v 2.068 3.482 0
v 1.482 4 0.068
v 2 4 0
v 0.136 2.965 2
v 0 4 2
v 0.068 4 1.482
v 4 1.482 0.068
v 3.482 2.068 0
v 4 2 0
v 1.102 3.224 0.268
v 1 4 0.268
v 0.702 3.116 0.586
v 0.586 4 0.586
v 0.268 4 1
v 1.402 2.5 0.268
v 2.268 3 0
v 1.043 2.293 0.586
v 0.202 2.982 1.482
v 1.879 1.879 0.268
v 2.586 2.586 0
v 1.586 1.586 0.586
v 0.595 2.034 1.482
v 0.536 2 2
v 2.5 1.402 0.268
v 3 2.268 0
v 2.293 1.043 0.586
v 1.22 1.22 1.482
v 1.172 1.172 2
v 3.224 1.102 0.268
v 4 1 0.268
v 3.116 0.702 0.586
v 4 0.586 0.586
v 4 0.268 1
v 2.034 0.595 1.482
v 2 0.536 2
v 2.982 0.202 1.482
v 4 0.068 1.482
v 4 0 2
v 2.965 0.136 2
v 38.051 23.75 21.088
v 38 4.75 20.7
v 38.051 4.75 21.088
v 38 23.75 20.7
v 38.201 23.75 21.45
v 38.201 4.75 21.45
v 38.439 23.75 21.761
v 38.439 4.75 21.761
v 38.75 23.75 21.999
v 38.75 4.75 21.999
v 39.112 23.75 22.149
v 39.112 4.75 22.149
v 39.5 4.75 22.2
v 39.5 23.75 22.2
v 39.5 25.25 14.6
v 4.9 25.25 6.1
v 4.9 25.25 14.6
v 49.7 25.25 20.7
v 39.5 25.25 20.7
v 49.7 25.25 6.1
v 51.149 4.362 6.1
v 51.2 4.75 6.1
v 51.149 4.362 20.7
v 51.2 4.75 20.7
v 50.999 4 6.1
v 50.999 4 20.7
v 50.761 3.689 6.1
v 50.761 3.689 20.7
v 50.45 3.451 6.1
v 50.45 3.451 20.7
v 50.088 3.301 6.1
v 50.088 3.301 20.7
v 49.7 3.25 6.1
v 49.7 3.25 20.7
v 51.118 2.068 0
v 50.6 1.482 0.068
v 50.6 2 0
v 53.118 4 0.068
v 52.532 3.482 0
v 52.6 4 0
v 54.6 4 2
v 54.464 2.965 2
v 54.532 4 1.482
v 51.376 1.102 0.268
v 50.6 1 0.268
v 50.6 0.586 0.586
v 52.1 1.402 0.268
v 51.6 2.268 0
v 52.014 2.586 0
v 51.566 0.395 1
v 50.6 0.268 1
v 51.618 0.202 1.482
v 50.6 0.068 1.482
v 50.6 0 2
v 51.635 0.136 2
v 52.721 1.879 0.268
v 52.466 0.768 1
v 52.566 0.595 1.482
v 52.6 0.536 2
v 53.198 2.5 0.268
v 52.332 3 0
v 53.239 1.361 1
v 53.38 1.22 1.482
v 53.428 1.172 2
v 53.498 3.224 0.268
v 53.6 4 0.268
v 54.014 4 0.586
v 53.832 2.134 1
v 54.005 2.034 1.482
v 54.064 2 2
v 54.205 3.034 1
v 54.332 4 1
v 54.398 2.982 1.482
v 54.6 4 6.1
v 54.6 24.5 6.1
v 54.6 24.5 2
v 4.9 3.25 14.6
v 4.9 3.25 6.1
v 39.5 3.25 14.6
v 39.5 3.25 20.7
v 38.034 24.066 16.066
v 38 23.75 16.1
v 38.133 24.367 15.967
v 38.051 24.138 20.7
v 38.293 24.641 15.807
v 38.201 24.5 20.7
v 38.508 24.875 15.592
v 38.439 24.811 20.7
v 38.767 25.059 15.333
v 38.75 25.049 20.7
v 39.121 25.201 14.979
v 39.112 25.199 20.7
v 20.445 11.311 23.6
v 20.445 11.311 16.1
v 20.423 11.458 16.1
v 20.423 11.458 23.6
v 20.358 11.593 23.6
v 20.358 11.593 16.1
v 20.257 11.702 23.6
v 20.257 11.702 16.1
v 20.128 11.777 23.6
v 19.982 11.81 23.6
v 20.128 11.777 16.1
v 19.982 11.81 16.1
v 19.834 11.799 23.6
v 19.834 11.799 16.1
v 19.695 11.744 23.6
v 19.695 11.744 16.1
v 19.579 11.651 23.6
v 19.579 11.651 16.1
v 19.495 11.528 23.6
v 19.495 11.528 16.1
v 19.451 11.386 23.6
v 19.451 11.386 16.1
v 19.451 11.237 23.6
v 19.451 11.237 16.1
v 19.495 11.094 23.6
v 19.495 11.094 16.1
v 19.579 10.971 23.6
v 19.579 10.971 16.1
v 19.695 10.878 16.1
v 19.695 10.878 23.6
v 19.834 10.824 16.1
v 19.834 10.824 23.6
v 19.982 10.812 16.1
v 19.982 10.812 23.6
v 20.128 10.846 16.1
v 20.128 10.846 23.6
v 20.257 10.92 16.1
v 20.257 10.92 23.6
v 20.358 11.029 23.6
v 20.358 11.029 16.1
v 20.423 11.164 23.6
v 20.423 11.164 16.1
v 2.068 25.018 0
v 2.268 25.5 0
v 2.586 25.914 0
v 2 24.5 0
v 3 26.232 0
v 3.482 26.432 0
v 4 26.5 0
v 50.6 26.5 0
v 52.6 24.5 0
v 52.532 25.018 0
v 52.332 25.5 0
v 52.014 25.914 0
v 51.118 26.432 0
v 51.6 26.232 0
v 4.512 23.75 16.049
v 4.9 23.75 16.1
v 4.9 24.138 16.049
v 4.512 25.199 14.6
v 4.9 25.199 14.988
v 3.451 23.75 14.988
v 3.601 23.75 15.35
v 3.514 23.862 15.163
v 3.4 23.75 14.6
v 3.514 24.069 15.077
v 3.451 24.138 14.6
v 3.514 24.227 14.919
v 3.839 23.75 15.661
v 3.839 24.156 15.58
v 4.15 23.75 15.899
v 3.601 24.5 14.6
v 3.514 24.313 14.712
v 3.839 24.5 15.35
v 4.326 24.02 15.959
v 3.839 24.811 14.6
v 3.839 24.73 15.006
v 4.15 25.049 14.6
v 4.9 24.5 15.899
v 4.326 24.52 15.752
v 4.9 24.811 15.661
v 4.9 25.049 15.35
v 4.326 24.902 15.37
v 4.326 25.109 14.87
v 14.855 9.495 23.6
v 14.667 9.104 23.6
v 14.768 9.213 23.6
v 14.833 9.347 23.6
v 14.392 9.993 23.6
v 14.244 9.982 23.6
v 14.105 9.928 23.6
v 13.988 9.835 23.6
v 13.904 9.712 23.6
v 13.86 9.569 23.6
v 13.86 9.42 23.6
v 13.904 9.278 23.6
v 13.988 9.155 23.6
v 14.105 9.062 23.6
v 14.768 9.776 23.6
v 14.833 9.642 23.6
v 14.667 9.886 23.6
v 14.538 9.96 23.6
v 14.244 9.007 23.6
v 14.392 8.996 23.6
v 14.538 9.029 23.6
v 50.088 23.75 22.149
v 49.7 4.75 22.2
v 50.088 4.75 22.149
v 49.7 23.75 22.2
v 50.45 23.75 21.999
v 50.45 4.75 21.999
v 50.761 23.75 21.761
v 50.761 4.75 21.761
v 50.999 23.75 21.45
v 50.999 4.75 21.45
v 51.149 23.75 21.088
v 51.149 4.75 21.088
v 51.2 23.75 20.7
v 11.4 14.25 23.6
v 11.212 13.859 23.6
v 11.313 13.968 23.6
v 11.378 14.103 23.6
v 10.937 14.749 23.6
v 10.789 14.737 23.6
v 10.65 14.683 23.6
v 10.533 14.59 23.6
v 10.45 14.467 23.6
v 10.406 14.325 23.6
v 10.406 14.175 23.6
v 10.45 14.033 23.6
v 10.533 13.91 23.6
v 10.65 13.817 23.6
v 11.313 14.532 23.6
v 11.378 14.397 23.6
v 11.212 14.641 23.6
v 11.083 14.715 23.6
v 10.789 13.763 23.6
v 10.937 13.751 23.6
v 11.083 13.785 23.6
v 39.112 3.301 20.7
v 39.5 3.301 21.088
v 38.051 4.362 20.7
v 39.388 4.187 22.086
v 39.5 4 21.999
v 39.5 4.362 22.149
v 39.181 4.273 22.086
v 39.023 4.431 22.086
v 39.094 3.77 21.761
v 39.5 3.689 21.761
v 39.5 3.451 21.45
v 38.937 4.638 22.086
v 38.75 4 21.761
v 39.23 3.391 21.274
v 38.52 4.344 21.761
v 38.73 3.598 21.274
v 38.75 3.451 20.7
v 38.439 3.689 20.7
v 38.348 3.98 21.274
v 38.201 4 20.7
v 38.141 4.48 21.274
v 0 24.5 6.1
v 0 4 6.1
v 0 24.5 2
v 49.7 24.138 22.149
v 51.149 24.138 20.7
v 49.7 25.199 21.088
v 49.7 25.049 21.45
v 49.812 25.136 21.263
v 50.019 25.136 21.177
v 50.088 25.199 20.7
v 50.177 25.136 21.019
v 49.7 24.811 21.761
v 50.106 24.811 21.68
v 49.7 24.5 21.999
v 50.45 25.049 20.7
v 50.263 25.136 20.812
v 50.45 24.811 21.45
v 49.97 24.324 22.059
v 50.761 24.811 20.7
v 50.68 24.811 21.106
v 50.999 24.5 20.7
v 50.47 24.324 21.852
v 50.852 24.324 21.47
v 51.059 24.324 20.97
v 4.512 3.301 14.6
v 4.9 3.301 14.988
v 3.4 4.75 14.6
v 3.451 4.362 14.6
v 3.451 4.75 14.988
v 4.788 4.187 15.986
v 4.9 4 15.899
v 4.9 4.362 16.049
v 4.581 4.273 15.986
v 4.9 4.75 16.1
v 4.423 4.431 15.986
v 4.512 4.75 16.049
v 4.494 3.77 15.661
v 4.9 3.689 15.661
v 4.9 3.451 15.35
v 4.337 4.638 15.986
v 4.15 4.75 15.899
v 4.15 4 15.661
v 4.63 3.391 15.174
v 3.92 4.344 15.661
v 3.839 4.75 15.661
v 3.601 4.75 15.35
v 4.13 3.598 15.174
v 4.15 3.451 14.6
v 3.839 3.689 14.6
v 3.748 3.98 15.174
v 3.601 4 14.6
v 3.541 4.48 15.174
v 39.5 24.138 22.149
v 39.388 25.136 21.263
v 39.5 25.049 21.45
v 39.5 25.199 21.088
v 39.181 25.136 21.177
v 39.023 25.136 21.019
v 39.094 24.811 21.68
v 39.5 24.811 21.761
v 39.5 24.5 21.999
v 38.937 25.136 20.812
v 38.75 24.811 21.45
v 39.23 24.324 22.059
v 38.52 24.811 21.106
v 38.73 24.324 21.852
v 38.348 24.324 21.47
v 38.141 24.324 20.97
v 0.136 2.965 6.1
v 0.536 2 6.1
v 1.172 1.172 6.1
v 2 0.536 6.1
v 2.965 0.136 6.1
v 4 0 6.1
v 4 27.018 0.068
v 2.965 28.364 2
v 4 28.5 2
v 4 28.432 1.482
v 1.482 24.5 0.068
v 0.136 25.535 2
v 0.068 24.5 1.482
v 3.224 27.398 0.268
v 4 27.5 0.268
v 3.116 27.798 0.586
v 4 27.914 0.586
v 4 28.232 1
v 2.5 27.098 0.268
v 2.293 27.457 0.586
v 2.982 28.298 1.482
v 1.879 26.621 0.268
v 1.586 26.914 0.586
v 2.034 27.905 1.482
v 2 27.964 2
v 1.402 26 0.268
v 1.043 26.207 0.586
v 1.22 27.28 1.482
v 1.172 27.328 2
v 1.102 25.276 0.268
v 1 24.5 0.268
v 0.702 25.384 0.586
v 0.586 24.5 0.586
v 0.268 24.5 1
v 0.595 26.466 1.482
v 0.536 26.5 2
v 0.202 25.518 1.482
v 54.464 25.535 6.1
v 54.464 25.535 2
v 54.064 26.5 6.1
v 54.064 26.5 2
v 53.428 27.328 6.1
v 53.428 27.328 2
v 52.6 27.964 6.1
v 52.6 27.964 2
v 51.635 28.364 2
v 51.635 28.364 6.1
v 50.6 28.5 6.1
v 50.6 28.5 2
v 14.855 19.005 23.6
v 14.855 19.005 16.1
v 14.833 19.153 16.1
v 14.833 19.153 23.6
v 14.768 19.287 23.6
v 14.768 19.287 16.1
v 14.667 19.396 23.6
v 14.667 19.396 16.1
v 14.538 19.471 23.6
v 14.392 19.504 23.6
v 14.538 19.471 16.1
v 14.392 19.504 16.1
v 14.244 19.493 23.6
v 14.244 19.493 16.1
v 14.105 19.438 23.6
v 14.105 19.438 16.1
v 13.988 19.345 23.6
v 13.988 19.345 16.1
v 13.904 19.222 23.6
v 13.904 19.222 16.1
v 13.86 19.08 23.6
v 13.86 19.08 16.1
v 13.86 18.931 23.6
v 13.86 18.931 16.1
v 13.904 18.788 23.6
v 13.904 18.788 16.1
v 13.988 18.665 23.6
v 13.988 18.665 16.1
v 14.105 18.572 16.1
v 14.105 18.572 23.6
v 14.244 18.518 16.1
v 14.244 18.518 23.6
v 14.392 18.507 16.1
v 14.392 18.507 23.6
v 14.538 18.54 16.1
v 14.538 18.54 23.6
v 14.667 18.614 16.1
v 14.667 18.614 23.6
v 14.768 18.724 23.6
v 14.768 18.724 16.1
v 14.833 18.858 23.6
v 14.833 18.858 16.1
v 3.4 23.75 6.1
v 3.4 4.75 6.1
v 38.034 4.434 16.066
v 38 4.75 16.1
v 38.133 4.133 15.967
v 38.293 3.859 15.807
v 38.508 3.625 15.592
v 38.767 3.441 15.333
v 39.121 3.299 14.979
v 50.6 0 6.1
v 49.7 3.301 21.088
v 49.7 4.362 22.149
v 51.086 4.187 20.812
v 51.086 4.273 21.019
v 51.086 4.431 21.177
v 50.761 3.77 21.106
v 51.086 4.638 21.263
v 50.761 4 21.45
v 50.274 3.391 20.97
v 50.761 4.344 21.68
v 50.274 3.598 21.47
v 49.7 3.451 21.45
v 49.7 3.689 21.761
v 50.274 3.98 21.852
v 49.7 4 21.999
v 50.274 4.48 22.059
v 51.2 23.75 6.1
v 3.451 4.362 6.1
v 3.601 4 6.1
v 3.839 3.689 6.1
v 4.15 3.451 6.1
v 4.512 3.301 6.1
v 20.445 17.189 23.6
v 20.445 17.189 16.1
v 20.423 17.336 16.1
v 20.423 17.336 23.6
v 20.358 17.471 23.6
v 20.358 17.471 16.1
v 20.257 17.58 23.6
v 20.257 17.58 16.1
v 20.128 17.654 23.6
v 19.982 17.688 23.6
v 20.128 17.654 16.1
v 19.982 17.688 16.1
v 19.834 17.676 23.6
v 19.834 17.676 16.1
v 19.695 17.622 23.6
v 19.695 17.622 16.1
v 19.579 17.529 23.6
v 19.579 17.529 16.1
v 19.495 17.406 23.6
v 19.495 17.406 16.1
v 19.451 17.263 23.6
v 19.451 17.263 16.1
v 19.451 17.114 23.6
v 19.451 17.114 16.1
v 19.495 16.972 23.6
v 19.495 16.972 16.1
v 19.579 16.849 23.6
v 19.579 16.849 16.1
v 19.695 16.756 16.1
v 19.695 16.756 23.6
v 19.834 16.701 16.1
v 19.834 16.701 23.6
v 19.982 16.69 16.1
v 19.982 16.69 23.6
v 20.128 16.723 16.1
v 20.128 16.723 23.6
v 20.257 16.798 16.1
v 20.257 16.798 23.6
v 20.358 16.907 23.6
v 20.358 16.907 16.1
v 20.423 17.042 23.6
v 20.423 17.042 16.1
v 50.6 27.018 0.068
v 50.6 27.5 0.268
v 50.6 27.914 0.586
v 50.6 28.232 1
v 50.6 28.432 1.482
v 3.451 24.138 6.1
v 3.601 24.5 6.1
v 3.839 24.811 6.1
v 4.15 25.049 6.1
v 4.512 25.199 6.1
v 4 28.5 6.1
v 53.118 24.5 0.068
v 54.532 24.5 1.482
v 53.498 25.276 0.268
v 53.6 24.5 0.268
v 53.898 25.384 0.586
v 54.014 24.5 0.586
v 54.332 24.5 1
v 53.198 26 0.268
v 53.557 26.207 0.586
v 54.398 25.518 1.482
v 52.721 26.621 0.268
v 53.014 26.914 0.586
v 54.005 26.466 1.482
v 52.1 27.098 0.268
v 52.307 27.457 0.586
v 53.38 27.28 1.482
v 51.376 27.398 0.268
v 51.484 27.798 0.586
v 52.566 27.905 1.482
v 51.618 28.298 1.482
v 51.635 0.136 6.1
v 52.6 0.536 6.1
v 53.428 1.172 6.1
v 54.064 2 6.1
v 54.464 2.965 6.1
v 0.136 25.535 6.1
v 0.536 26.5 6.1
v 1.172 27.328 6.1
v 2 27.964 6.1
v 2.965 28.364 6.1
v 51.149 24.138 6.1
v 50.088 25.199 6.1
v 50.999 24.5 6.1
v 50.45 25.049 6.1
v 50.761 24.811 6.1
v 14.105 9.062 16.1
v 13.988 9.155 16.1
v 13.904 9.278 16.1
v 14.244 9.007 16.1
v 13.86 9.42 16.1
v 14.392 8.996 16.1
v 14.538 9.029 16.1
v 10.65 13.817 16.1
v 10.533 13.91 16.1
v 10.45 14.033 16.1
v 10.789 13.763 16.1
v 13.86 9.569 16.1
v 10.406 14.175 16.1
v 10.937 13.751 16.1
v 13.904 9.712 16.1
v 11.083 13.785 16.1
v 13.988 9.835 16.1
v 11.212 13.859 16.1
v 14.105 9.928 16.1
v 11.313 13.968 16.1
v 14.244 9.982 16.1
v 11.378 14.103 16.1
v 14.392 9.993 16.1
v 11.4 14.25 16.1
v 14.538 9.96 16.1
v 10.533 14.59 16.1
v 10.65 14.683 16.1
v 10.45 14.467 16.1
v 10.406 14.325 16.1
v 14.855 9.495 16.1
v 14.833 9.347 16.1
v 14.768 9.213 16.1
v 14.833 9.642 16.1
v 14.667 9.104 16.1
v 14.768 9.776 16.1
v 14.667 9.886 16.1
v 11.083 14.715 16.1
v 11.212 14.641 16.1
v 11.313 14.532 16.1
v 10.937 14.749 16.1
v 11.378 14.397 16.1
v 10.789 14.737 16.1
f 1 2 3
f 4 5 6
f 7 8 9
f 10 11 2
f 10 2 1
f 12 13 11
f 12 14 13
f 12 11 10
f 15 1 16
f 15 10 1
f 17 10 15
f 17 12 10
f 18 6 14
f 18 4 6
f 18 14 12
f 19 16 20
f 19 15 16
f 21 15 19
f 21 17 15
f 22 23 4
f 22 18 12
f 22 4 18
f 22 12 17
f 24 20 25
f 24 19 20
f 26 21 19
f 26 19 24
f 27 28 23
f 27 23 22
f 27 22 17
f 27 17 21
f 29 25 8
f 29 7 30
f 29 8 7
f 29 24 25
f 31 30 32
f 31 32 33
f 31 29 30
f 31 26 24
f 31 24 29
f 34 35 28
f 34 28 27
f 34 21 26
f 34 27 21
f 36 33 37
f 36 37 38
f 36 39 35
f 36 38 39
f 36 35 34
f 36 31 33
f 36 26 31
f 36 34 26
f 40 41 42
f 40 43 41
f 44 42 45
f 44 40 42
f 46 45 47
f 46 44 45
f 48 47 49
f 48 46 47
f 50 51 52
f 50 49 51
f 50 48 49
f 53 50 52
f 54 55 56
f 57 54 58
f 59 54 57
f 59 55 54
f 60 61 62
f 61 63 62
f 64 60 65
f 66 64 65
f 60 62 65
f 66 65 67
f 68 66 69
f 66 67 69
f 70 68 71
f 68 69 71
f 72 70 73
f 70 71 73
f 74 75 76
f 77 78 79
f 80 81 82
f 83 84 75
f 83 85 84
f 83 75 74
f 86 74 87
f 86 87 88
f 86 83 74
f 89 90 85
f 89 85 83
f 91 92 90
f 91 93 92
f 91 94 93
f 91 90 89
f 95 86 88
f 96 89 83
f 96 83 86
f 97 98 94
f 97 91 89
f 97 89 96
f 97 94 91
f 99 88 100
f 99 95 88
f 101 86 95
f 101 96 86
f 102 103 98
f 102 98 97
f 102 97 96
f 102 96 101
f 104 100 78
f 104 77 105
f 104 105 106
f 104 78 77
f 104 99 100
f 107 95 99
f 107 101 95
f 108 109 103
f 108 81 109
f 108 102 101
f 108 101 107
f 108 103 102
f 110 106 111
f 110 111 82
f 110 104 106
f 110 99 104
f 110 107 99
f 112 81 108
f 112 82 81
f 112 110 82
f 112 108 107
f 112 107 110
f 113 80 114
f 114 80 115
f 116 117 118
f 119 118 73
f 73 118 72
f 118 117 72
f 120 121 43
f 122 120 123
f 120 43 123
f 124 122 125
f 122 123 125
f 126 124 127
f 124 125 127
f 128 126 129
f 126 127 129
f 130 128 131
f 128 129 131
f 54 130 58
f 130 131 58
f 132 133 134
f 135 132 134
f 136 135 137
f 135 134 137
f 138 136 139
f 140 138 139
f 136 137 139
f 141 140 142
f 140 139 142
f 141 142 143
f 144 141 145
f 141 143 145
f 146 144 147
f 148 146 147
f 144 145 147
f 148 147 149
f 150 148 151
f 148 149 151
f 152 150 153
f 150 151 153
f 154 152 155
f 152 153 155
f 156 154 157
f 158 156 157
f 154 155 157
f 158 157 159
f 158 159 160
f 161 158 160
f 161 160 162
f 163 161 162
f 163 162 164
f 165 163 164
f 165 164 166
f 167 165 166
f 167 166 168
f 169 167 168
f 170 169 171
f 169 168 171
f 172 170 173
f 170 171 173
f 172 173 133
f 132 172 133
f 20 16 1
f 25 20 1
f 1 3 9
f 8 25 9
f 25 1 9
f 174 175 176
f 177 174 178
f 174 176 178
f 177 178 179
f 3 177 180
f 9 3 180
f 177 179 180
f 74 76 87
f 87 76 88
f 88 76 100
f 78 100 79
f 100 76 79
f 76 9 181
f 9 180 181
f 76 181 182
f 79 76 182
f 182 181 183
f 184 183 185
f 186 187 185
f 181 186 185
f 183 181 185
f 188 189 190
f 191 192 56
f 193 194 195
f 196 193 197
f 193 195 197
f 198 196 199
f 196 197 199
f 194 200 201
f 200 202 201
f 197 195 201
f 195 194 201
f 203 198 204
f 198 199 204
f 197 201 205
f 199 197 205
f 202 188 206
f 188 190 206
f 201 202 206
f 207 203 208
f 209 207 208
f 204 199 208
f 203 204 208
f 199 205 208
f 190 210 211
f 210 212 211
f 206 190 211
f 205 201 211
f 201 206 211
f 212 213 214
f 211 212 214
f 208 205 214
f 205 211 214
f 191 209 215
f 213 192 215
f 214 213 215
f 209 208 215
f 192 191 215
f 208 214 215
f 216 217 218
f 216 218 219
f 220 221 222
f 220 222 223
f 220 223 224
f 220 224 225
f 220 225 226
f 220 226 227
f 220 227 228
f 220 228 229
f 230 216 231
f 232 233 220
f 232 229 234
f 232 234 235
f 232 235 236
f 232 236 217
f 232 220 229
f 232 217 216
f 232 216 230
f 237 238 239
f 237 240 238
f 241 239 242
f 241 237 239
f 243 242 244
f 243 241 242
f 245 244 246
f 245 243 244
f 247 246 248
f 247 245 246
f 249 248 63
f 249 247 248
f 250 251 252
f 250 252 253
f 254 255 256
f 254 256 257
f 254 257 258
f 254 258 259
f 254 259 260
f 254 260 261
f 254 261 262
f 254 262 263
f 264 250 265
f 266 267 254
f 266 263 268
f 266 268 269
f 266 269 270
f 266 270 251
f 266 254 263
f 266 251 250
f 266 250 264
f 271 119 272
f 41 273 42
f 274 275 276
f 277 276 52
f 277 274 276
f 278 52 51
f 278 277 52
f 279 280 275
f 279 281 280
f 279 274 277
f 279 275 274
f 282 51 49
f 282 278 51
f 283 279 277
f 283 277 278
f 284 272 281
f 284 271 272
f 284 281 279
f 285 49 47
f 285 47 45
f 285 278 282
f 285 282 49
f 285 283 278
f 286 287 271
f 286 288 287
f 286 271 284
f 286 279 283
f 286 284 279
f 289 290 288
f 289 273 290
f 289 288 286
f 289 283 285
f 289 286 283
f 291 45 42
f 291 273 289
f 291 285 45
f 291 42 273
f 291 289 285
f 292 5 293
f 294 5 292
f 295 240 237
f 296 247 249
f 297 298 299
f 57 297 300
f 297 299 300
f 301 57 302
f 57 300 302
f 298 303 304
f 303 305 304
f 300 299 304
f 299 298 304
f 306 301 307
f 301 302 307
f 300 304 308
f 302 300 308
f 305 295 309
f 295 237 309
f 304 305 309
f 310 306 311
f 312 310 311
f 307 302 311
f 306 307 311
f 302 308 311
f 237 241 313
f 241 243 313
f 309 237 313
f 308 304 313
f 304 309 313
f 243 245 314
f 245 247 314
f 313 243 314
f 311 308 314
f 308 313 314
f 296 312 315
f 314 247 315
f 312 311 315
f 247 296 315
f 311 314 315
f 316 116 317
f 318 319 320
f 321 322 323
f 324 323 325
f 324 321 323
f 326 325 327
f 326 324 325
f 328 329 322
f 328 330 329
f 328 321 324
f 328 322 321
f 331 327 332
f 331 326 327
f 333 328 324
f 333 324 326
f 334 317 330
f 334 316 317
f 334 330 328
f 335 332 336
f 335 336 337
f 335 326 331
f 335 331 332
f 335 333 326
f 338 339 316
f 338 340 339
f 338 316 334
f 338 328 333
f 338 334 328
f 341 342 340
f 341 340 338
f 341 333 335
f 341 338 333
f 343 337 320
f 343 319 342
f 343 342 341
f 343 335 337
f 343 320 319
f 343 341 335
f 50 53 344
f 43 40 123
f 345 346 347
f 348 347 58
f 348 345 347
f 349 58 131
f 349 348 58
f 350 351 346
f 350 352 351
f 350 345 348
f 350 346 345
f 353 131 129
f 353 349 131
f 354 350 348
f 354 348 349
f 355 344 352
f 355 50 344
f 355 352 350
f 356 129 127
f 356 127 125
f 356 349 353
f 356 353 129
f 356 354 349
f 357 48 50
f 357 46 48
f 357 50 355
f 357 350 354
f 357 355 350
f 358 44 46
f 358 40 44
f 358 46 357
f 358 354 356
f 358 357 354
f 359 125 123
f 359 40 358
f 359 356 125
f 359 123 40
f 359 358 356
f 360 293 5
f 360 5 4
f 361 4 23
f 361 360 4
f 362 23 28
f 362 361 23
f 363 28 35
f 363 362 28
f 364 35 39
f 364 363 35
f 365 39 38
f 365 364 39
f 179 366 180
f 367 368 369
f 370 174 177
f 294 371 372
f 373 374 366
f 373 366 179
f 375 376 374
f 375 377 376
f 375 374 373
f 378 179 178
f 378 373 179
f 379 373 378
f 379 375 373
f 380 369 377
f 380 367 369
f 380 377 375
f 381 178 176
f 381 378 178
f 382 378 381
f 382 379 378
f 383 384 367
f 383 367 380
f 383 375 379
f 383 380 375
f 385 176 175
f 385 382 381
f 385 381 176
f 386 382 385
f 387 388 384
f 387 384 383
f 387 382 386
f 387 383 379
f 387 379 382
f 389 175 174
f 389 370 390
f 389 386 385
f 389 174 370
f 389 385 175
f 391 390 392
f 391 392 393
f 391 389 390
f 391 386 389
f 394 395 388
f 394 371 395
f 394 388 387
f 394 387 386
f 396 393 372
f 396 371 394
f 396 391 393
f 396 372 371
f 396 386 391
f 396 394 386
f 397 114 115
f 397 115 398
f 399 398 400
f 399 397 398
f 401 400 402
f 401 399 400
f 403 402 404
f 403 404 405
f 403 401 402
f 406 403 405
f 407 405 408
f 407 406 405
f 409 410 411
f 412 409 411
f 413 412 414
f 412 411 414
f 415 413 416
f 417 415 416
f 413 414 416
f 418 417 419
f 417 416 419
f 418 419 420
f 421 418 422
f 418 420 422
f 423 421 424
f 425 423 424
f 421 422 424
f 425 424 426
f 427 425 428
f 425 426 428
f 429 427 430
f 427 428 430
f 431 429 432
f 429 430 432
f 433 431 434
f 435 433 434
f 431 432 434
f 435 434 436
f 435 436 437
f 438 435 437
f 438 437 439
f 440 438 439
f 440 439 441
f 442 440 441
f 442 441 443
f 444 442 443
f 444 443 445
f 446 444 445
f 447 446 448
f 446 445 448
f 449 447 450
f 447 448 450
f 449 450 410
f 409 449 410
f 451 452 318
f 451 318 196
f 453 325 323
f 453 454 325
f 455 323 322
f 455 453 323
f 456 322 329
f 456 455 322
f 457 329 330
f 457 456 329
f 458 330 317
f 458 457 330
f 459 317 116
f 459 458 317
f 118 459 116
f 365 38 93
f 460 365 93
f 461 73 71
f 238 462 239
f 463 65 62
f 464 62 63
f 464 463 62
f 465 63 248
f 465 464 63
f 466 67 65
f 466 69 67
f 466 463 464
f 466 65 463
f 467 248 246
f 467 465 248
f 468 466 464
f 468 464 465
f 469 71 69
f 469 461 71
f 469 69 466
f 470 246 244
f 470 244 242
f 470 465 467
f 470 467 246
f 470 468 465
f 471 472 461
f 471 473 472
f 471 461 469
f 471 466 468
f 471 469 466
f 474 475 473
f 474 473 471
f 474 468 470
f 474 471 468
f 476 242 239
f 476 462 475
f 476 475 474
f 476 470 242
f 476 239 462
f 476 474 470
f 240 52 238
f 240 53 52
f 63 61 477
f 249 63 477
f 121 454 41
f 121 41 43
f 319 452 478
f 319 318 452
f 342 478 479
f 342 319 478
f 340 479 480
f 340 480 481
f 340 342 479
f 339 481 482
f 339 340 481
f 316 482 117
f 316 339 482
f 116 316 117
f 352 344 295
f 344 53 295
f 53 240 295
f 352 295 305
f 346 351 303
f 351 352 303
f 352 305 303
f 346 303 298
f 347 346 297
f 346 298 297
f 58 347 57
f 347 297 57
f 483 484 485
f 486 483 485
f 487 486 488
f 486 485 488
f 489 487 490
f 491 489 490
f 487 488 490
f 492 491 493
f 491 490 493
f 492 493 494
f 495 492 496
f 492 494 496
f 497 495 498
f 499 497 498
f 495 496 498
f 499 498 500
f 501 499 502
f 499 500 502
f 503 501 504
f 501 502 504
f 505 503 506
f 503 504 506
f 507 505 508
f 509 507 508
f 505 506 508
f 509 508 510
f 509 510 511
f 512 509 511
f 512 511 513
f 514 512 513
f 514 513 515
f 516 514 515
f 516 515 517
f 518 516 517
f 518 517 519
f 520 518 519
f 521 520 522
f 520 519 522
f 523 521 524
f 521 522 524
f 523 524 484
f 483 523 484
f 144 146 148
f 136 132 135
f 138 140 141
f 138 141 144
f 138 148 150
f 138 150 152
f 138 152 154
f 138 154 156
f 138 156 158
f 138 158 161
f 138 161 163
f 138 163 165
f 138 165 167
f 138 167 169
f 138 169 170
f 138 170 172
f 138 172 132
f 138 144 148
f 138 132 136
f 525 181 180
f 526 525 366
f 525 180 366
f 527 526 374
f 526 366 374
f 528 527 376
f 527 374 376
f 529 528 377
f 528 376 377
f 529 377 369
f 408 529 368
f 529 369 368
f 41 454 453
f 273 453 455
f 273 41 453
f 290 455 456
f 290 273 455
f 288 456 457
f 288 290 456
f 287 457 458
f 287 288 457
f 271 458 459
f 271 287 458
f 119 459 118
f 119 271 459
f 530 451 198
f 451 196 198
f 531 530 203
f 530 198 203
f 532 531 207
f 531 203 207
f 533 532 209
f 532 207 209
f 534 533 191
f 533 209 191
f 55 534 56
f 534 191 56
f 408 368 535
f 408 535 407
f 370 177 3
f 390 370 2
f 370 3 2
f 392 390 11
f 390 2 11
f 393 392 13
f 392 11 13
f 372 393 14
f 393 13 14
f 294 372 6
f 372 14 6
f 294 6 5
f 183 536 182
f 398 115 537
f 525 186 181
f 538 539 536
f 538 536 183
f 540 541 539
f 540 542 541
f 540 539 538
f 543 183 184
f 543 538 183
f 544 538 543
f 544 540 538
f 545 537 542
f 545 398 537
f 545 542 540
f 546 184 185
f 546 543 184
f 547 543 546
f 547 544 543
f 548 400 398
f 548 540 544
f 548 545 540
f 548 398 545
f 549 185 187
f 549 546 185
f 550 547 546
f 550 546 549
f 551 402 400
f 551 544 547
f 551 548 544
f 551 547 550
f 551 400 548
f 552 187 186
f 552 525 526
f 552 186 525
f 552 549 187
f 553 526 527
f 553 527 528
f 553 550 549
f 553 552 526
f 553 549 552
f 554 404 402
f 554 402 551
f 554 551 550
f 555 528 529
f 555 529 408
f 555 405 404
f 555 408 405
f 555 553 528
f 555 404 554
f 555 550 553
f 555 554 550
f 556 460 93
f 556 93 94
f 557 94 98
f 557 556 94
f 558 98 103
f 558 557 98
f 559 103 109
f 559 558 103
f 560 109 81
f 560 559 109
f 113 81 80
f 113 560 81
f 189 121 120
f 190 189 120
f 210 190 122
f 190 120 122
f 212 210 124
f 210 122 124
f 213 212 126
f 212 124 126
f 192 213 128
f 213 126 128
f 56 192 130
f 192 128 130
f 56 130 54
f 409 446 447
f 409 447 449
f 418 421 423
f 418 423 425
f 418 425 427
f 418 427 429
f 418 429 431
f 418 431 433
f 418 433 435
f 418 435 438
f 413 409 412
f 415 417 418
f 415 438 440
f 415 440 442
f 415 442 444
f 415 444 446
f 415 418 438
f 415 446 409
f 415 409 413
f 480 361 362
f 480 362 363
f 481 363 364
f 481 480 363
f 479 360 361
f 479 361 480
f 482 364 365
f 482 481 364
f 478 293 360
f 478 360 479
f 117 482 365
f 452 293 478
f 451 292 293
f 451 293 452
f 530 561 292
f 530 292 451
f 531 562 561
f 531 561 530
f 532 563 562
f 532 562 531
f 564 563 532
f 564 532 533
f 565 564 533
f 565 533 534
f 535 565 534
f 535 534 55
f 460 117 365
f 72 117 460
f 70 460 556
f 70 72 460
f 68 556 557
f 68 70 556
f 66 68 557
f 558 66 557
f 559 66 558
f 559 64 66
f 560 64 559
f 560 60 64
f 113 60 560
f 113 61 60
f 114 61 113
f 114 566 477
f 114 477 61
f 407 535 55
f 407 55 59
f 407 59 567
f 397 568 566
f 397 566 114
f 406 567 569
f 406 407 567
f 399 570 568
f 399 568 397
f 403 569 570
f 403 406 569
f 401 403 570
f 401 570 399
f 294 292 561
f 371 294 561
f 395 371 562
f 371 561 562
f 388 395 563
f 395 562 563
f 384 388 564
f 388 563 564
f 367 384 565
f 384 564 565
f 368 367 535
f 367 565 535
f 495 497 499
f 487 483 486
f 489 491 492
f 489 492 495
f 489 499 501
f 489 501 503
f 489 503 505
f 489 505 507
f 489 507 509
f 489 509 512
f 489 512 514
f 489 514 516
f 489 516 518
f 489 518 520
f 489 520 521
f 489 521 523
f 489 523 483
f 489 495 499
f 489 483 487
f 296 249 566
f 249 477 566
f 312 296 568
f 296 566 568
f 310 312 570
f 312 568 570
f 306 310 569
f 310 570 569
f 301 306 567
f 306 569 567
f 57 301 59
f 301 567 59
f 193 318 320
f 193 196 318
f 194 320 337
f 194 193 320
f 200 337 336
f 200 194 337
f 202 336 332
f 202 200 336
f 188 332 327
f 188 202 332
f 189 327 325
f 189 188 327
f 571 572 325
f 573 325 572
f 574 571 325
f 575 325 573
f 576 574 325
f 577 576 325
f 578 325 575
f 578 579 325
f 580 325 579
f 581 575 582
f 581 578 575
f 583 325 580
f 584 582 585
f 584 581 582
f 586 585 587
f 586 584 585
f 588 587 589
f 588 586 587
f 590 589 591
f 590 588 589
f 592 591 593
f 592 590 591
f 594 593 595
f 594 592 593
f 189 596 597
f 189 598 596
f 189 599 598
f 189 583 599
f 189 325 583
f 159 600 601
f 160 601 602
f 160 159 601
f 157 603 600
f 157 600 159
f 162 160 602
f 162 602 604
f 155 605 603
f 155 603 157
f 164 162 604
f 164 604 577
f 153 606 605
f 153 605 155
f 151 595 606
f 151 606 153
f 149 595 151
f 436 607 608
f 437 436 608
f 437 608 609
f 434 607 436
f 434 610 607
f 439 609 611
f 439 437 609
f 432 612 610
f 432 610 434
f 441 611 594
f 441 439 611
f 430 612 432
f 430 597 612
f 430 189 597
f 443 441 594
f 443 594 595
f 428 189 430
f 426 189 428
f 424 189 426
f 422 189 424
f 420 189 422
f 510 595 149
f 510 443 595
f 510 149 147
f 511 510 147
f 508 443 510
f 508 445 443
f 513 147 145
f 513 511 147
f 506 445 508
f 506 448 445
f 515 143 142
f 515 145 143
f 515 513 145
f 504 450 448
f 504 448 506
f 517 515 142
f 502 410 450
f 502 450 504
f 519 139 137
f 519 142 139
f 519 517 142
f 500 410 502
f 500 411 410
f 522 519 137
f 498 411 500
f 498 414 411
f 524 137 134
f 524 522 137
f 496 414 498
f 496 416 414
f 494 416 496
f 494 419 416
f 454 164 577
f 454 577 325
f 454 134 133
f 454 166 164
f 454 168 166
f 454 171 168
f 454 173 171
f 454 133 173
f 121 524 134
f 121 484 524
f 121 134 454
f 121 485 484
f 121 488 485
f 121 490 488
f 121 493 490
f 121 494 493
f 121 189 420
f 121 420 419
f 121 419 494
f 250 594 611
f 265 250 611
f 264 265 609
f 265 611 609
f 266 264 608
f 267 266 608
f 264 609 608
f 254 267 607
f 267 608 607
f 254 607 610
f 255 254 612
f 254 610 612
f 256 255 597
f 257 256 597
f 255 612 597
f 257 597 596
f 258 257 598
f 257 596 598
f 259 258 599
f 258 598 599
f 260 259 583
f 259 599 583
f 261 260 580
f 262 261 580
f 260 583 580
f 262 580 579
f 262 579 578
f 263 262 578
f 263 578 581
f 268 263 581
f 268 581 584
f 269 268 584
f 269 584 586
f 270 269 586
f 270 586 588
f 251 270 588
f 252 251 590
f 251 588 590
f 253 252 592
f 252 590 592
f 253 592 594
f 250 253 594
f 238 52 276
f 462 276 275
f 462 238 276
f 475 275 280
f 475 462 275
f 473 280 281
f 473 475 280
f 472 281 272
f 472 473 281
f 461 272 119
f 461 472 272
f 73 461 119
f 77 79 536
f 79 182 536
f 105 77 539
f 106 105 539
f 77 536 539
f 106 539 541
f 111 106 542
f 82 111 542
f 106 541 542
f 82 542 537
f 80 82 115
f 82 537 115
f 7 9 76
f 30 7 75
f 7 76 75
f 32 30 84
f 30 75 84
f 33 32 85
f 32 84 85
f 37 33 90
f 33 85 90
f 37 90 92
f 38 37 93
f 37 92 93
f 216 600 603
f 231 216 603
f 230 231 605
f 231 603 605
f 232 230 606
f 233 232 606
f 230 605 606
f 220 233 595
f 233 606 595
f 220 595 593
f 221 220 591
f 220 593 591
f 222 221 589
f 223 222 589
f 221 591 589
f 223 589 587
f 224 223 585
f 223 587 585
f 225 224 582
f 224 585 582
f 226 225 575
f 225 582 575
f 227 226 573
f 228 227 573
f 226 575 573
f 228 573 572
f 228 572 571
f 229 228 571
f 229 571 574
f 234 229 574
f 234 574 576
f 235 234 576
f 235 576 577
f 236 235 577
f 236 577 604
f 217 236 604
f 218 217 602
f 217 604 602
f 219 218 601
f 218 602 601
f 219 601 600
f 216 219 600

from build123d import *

# Parameters (mm, degrees)
F0_W      = 54.6
F0_H      = 28.5
F1_DEPTH  = 6.1
F2_R      = 4
F3_R      = 2
F4_W      = 47.8
F4_H      = 22
F5_DEPTH  = 10
F6_W      = 13.2
F6_H      = 22
F7_DEPTH  = 6.1
F8_R      = 1.5
F9_R      = 0.5
F10_DEPTH = 7.5


with BuildPart() as f1:
    # F0 (on Top) → F1 (new body)
    with BuildSketch(Plane.XY):
        with Locations((27.3, 14.25)):
            Rectangle(F0_W, F0_H)
    extrude(amount=F1_DEPTH)

    # F2
    f2_edges = [f1.edges().sort_by_distance(p)[0] for p in [
        (54.6, 0, 3.05),
        (0, 0, 3.05),
        (54.6, 28.5, 3.05),
        (0, 28.5, 3.05),
    ]]
    fillet(f2_edges, radius=F2_R)

    # F3
    f3_edges = [f1.edges().sort_by_distance(p)[0] for p in [
        (54.6, 14.25, 0),
        (53.428427, 1.171573, 0),
        (27.3, 0, 0),
        (53.428427, 27.328427, 0),
        (1.171573, 1.171573, 0),
        (0, 14.25, 0),
        (1.171573, 27.328427, 0),
        (27.3, 28.5, 0),
    ]]
    fillet(f3_edges, radius=F3_R)

    # F4 (on face) → F5 (join)
    with BuildSketch(Plane.XY.offset(6.1)):
        with Locations((27.3, 14.25)):
            Rectangle(F4_W, F4_H)
    extrude(amount=F5_DEPTH)

    # F6 (on face) → F7 (join)
    with BuildSketch(Plane.XY.offset(16.1)):
        with Locations((44.6, 14.25)):
            Rectangle(F6_W, F6_H)
    extrude(amount=F7_DEPTH)

    # F8
    f8_edges = [f1.edges().sort_by_distance(p)[0] for p in [
        (3.4, 3.25, 11.1),
        (20.7, 3.25, 16.1),
        (38, 3.25, 19.15),
        (44.6, 3.25, 22.2),
        (51.2, 3.25, 14.15),
        (51.2, 14.25, 22.2),
        (38, 14.25, 22.2),
        (44.6, 25.25, 22.2),
        (51.2, 25.25, 14.15),
        (20.7, 25.25, 16.1),
        (3.4, 14.25, 16.1),
        (38, 25.25, 19.15),
        (3.4, 25.25, 11.1),
    ]]
    fillet(f8_edges, radius=F8_R)

    # F9 (on face) → F10 (join)
    with BuildSketch(Plane.XY.offset(16.1)):
        with Locations((10.9, 14.25)):
            Circle(F9_R)
        with Locations((14.3549150281, 9.4947174185)):
            Circle(F9_R)
        with Locations((19.9450849719, 11.3110737385)):
            Circle(F9_R)
        with Locations((19.9450849719, 17.1889262615)):
            Circle(F9_R)
        with Locations((14.3549150281, 19.0052825815)):
            Circle(F9_R)
    extrude(amount=F10_DEPTH)


solid = f1.part
